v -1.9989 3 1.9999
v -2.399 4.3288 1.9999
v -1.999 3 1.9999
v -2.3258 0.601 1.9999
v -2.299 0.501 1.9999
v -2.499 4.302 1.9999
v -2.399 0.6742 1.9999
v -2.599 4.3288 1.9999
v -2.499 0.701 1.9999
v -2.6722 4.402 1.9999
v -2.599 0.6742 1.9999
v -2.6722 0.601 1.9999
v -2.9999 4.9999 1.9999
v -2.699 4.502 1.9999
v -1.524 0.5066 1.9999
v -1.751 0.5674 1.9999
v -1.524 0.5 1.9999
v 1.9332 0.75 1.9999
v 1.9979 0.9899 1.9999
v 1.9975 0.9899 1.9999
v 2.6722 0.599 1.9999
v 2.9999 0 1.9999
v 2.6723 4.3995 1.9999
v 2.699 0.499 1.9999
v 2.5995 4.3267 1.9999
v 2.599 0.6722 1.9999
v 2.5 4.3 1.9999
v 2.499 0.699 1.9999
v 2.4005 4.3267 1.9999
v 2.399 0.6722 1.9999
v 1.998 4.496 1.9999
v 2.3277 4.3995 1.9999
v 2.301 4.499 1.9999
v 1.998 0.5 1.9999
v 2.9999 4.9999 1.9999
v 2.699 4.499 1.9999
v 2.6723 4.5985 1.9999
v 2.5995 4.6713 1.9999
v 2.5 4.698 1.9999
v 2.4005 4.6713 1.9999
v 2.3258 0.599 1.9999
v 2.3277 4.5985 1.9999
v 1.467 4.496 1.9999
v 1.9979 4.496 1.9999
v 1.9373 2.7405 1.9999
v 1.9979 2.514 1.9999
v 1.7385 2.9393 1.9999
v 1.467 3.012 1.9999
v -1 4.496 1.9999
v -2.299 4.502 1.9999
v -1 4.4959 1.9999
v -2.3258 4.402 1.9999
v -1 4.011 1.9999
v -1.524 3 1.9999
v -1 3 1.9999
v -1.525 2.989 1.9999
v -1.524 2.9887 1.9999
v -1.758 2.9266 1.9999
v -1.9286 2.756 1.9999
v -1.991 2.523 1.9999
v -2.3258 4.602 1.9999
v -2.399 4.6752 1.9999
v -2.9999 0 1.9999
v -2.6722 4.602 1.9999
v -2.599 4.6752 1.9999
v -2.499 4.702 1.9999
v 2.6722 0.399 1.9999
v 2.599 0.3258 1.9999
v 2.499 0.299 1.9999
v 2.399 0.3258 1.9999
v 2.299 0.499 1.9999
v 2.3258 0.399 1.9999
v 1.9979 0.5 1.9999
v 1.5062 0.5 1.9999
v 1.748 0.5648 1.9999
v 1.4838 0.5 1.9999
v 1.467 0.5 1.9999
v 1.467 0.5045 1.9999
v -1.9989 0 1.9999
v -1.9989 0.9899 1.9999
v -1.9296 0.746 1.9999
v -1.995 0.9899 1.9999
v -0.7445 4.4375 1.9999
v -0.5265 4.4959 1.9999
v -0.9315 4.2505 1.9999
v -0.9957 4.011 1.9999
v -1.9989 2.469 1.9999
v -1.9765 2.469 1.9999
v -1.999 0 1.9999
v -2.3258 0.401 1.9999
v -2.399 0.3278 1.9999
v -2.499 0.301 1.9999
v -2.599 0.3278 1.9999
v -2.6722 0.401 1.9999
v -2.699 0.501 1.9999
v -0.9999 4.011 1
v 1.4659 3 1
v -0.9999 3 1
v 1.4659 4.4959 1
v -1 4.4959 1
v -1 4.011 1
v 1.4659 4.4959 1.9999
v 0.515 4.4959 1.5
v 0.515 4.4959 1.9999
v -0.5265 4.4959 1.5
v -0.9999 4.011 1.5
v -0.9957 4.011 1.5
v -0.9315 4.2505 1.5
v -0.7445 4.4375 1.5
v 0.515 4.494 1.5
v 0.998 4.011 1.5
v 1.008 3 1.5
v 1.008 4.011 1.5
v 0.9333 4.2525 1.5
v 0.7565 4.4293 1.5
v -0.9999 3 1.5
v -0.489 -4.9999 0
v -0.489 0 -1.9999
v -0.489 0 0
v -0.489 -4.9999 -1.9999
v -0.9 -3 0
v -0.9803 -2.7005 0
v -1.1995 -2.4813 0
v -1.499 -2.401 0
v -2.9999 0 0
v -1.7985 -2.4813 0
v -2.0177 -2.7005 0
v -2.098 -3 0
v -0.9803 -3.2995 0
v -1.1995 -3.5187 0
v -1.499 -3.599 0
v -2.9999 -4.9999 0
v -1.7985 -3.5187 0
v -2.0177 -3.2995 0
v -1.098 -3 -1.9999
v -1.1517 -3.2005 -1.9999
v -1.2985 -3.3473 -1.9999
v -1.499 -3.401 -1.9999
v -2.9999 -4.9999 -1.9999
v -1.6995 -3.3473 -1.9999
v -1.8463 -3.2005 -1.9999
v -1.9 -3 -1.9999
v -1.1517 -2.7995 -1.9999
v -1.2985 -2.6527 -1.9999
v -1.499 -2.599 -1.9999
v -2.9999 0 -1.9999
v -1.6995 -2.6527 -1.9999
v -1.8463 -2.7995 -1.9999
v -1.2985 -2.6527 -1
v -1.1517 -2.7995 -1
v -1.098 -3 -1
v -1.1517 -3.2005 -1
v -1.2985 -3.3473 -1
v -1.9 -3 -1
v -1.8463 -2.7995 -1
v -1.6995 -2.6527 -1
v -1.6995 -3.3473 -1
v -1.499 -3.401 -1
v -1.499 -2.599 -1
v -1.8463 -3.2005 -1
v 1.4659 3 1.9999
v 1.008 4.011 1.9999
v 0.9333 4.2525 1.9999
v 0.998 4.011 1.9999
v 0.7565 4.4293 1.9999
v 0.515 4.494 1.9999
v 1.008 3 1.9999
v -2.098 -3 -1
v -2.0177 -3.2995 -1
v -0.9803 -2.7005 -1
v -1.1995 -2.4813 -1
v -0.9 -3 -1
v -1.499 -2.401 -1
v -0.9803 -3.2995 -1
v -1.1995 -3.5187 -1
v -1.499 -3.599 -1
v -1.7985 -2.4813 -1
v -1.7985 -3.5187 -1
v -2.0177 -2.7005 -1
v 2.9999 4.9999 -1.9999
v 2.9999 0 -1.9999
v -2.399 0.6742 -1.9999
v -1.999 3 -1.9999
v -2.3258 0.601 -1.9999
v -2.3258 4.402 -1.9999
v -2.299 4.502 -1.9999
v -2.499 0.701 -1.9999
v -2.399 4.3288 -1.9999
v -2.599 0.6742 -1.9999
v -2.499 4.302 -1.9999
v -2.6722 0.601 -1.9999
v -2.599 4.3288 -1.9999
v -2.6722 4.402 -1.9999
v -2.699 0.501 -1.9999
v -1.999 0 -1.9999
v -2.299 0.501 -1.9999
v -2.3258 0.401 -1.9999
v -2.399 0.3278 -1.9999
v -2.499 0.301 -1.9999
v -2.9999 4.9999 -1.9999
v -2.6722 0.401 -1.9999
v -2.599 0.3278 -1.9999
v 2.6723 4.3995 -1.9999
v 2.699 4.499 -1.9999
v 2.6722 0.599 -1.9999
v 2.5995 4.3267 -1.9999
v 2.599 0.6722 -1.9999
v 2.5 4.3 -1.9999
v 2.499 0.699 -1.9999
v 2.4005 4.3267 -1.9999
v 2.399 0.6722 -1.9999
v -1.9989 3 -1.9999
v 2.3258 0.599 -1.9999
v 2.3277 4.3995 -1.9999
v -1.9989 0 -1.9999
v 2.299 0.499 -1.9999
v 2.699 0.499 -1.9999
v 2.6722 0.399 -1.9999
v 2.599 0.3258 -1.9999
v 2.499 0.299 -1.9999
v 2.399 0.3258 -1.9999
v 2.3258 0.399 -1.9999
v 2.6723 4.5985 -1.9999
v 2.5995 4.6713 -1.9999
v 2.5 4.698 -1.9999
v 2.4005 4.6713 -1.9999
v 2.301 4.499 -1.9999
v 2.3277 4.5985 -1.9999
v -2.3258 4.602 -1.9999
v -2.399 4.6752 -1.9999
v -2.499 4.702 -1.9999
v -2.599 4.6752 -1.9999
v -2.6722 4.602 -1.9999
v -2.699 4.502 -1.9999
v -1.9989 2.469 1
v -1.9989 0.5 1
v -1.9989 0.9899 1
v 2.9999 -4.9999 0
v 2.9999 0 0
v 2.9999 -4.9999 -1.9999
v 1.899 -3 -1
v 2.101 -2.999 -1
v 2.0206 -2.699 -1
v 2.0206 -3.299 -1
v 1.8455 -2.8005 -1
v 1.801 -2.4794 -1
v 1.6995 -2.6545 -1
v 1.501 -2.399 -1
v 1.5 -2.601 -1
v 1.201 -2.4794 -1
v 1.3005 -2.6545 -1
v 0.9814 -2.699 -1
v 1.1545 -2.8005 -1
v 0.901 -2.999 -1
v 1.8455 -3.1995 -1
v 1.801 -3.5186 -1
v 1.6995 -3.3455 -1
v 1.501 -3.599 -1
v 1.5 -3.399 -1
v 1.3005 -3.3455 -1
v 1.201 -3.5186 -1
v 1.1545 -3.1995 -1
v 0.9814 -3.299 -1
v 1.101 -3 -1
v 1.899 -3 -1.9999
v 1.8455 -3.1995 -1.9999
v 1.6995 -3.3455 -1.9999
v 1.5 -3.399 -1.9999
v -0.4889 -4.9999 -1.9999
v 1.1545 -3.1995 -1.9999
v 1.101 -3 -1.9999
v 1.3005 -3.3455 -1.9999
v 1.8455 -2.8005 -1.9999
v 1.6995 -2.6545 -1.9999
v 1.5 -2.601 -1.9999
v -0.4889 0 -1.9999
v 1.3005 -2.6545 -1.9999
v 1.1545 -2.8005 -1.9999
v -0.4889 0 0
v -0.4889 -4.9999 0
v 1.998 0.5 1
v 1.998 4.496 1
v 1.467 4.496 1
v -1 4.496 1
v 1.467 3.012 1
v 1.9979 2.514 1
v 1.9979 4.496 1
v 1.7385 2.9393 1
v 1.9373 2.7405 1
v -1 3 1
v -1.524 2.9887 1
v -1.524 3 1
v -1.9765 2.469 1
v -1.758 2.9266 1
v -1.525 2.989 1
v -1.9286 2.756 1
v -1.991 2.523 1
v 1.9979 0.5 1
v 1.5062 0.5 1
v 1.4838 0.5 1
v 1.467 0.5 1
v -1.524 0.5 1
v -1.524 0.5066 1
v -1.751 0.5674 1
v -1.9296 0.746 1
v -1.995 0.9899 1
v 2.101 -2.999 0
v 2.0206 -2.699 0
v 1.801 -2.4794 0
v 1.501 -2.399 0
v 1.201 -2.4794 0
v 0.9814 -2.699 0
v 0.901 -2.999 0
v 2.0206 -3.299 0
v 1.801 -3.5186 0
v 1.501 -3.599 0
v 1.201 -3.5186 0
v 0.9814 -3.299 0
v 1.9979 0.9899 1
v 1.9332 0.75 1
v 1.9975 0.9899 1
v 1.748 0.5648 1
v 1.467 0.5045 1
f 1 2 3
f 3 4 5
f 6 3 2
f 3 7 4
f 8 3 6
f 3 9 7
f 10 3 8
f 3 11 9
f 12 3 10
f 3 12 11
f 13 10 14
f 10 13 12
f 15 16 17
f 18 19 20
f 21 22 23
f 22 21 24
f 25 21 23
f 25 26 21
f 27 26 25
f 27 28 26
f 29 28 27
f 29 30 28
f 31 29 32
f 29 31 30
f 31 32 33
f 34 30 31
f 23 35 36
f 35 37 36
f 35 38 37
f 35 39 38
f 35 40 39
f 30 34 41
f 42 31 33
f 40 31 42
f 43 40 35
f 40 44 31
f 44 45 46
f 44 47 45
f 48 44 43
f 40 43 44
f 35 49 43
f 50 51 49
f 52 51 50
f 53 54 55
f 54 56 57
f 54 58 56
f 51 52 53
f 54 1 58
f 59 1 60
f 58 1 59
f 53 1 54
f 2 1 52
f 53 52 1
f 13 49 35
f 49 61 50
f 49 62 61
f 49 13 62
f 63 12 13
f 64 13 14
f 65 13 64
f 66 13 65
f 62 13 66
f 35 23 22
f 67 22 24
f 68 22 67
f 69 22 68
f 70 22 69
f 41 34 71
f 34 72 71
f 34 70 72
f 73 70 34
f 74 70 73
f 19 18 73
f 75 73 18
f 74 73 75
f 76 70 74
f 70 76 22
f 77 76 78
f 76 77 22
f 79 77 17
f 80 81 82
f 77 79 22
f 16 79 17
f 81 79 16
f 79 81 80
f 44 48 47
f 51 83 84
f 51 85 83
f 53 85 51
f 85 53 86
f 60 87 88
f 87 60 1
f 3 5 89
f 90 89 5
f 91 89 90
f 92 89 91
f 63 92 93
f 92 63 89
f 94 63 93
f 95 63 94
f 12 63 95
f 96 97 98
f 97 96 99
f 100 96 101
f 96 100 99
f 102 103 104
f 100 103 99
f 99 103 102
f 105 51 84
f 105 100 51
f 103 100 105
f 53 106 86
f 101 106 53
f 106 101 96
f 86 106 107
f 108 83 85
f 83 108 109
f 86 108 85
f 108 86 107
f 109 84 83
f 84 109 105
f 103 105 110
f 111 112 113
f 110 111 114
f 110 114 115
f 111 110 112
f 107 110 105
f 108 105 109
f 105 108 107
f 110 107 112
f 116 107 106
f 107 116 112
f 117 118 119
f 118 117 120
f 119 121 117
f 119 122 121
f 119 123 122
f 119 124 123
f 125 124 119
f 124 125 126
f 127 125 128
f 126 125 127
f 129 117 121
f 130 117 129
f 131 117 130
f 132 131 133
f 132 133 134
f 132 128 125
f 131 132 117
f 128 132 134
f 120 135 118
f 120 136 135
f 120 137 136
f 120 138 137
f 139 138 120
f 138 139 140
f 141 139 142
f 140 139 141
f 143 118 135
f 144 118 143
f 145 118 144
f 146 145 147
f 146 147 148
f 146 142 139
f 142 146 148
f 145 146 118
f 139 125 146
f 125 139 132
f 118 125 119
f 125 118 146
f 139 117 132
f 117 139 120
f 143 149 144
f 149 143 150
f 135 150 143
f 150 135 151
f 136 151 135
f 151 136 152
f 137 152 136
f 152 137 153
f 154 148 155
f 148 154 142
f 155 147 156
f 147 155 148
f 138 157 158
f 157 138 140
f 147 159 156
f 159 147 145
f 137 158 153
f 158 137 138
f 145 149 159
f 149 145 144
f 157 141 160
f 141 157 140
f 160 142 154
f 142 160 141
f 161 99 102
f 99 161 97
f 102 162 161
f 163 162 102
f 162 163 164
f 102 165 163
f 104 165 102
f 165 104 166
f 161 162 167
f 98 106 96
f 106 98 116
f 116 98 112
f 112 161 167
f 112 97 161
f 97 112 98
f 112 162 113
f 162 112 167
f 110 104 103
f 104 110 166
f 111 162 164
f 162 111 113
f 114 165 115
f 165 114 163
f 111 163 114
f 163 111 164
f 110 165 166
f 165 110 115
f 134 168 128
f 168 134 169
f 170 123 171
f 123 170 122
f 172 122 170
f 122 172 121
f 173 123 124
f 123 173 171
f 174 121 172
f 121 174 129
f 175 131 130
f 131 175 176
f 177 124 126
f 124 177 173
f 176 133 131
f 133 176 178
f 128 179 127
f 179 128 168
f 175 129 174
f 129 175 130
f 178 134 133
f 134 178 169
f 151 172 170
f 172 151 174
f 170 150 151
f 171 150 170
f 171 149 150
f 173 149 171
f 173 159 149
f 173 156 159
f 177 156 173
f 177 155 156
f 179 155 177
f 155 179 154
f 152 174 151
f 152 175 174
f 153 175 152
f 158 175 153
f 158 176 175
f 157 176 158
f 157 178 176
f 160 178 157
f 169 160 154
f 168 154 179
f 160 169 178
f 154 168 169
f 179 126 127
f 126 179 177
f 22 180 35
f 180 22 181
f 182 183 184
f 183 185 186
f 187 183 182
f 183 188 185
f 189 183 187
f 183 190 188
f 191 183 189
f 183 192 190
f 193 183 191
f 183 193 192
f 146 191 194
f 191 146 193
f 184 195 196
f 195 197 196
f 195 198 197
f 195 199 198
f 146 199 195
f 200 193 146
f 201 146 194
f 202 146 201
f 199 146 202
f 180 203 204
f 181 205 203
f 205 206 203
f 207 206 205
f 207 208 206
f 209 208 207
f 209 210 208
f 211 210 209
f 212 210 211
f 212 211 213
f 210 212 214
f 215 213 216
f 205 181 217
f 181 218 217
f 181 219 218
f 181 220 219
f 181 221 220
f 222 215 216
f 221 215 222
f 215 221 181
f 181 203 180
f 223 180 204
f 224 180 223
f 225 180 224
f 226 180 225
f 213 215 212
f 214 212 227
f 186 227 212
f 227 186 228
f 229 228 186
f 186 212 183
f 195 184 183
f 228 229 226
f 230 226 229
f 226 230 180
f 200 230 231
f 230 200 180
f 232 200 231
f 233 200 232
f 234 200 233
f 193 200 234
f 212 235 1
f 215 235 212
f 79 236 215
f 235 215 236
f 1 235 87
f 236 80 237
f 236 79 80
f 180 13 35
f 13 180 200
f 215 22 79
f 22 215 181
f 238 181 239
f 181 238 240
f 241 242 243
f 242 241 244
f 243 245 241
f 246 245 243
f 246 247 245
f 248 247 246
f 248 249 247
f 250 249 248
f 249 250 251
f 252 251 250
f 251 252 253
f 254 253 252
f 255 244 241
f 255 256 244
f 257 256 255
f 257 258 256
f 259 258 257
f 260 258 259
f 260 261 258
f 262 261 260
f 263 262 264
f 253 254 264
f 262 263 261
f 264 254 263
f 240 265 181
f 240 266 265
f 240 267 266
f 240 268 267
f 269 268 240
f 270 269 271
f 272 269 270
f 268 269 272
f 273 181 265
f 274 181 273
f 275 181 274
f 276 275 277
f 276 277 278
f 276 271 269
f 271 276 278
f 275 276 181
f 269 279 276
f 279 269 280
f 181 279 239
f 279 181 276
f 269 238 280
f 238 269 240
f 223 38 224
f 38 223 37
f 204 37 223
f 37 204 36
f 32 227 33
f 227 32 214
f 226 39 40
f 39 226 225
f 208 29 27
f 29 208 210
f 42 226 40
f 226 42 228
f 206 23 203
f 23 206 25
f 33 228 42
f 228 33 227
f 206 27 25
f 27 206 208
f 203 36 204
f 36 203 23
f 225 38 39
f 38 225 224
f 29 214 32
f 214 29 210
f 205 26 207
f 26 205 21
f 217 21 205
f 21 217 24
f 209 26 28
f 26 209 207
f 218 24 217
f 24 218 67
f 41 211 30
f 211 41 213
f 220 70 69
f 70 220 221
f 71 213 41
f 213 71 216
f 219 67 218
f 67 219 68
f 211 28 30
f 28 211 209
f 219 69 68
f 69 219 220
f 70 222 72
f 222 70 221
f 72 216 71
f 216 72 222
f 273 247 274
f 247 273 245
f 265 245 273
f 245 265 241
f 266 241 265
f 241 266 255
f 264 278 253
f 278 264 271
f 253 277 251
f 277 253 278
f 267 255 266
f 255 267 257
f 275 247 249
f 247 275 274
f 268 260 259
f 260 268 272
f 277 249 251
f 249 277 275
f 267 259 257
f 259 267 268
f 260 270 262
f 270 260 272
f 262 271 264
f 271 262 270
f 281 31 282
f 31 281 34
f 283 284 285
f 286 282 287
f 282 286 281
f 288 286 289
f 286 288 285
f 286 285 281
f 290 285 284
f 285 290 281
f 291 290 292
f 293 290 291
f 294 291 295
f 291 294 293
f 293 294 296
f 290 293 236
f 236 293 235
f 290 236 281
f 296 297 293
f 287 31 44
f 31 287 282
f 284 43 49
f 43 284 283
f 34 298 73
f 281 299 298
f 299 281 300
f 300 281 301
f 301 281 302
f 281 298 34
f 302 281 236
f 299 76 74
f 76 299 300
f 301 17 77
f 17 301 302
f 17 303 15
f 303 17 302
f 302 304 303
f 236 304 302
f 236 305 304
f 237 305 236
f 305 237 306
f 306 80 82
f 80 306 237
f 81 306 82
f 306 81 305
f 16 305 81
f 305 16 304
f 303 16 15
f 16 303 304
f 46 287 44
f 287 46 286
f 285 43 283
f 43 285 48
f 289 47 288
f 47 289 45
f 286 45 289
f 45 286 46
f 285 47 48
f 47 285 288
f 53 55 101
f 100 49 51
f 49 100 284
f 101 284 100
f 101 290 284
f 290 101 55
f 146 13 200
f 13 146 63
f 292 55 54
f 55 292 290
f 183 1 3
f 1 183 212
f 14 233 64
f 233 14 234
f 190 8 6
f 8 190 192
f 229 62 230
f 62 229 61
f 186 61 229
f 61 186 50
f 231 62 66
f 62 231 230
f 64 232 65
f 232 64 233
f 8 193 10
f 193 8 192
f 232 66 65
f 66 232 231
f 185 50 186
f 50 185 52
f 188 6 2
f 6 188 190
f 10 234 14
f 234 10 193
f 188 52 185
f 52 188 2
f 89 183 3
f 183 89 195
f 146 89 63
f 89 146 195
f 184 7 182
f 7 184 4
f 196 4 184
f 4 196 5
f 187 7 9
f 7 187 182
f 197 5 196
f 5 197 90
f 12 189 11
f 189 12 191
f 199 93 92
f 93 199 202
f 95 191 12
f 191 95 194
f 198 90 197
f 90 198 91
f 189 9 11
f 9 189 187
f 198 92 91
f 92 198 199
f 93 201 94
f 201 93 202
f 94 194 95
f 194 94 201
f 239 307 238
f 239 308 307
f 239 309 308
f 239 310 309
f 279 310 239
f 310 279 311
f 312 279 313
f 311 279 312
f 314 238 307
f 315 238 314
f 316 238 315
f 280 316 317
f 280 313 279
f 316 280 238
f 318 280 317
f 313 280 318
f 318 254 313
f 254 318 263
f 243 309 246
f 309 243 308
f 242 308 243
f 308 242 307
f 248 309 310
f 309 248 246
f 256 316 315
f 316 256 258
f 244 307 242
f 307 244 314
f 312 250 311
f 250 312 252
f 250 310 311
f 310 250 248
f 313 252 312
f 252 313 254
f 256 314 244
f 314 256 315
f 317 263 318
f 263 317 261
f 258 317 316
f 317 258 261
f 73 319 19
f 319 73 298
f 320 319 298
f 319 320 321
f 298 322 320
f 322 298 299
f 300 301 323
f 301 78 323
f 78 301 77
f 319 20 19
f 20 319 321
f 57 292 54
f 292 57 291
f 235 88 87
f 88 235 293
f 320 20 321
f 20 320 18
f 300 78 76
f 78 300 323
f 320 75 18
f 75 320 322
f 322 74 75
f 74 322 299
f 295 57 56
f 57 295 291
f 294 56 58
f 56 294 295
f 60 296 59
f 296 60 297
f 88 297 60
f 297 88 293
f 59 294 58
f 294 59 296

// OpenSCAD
intersection() {
  cube(size = [7.1999, 11.9999, 4.7999], center = true);

  union() {
    difference() {
      translate([-1.244, 4.2535, 1.5])
      cube(size = [1.5099, 0.4849, 0.9999], center = true);
    
      translate([-0.489, 3.995, 9.8])
      cylinder(h = 16.6, r1 = 0.511, r2 = 0.511, center = true, $fn = 12);
    }
  
    difference() {
      union() {
        difference() {
          translate([-1.7445, -2.5, -1])
          cube(size = [2.5109, 4.9999, 1.9999], center = true);
        
          translate([-1.499, -3, -9.05])
          cylinder(h = 18.1, r1 = 0.401, r2 = 0.401, center = true, $fn = 12);
        }
      
        difference() {
          translate([0.233, 3.748, 1.5])
          cube(size = [2.4659, 1.4959, 0.9999], center = true);
        
          translate([0.7615, 3.5055, 9.8])
          cube(size = [0.493, 1.011, 16.6], center = true);
        }
      }
    
      union() {
        translate([0.515, 4.011, 1.75])
        cylinder(h = 0.5, r1 = 0.483, r2 = 0.483, center = true, $fn = 12);
      
        translate([-1.2425, 2.498, 1.75])
        cube(size = [3.515, 3.996, 0.5], center = true);
      
        translate([-1.499, -3, 0])
        cylinder(h = 2, r1 = 0.599, r2 = 0.599, center = true, $fn = 12);
      }
    }
  
    difference() {
      union() {
        translate([0.5005, 2.5, 0])
        cube(size = [4.9989, 4.9999, 3.9999], center = true);
      
        translate([1.2555, -2.5, -1.5])
        cube(size = [3.4889, 4.9999, 0.9999], center = true);
      
        translate([0.515, 4.011, 10.05])
        cylinder(h = 16.0999, r1 = 0.483, r2 = 0.483, center = true, $fn = 12);
      }
    
      union() {
        translate([2.5, 4.499, 8.05])
        cylinder(h = 20.1, r1 = 0.199, r2 = 0.199, center = true, $fn = 12);
      
        translate([2.499, 0.499, -8.05])
        cylinder(h = 20.1, r1 = 0.2, r2 = 0.2, center = true, $fn = 12);
      
        translate([1.5, -3, -9.55])
        cylinder(h = 17.1, r1 = 0.399, r2 = 0.399, center = true, $fn = 12);
      
        translate([-0.0005, 2.498, 9.55])
        cube(size = [3.997, 3.996, 17.1], center = true);
      }
    }
  
    difference() {
      translate([-1.7615, 0.495, 1.5])
      cube(size = [0.4749, 0.9899, 0.9999], center = true);
    
      translate([-1.507, 0.99, 9.55])
      cylinder(h = 17.1, r1 = 0.488, r2 = 0.488, center = true, $fn = 12);
    }
  
    difference() {
      translate([1.7325, 3.7345, 1])
      cube(size = [0.5309, 2.5309, 1.9999], center = true);
    
      translate([1.467, 2.469, 1.5])
      cylinder(h = 1, r1 = 0.543, r2 = 0.543, center = true, $fn = 12);
    }
  
    difference() {
      translate([-2, 4, 0])
      cube(size = [1.9999, 1.9999, 3.9999], center = true);
    
      translate([-2.499, 4.502, 0])
      cylinder(h = 4, r1 = 0.2, r2 = 0.2, center = true, $fn = 12);
    }
  
    difference() {
      translate([-2.4995, 2.0055, 0])
      cube(size = [1.0009, 4.0109, 3.9999], center = true);
    
      translate([-2.499, 0.501, 0])
      cylinder(h = 4, r1 = 0.2, r2 = 0.2, center = true, $fn = 12);
    }
  
    difference() {
      translate([1.2555, -2.5, -1])
      cube(size = [3.4889, 4.9999, 1.9999], center = true);
    
      translate([1.501, -2.999, -8.3])
      cylinder(h = 19.6, r1 = 0.6, r2 = 0.6, center = true, $fn = 12);
    }
  
    difference() {
      union() {
        translate([1.7325, 0.495, 1.5])
        cube(size = [0.5309, 0.9899, 0.9999], center = true);
      
        translate([-1.7615, 3.24, 0])
        cube(size = [0.4749, 1.5419, 3.9999], center = true);
      }
    
      union() {
        translate([1.495, 1.003, 1])
        cylinder(h = 2, r1 = 0.506, r2 = 0.506, center = true, $fn = 12);
      
        translate([-1.525, 2.523, 9.55])
        cylinder(h = 17.1, r1 = 0.466, r2 = 0.466, center = true, $fn = 12);
      }
    }
  }
}
